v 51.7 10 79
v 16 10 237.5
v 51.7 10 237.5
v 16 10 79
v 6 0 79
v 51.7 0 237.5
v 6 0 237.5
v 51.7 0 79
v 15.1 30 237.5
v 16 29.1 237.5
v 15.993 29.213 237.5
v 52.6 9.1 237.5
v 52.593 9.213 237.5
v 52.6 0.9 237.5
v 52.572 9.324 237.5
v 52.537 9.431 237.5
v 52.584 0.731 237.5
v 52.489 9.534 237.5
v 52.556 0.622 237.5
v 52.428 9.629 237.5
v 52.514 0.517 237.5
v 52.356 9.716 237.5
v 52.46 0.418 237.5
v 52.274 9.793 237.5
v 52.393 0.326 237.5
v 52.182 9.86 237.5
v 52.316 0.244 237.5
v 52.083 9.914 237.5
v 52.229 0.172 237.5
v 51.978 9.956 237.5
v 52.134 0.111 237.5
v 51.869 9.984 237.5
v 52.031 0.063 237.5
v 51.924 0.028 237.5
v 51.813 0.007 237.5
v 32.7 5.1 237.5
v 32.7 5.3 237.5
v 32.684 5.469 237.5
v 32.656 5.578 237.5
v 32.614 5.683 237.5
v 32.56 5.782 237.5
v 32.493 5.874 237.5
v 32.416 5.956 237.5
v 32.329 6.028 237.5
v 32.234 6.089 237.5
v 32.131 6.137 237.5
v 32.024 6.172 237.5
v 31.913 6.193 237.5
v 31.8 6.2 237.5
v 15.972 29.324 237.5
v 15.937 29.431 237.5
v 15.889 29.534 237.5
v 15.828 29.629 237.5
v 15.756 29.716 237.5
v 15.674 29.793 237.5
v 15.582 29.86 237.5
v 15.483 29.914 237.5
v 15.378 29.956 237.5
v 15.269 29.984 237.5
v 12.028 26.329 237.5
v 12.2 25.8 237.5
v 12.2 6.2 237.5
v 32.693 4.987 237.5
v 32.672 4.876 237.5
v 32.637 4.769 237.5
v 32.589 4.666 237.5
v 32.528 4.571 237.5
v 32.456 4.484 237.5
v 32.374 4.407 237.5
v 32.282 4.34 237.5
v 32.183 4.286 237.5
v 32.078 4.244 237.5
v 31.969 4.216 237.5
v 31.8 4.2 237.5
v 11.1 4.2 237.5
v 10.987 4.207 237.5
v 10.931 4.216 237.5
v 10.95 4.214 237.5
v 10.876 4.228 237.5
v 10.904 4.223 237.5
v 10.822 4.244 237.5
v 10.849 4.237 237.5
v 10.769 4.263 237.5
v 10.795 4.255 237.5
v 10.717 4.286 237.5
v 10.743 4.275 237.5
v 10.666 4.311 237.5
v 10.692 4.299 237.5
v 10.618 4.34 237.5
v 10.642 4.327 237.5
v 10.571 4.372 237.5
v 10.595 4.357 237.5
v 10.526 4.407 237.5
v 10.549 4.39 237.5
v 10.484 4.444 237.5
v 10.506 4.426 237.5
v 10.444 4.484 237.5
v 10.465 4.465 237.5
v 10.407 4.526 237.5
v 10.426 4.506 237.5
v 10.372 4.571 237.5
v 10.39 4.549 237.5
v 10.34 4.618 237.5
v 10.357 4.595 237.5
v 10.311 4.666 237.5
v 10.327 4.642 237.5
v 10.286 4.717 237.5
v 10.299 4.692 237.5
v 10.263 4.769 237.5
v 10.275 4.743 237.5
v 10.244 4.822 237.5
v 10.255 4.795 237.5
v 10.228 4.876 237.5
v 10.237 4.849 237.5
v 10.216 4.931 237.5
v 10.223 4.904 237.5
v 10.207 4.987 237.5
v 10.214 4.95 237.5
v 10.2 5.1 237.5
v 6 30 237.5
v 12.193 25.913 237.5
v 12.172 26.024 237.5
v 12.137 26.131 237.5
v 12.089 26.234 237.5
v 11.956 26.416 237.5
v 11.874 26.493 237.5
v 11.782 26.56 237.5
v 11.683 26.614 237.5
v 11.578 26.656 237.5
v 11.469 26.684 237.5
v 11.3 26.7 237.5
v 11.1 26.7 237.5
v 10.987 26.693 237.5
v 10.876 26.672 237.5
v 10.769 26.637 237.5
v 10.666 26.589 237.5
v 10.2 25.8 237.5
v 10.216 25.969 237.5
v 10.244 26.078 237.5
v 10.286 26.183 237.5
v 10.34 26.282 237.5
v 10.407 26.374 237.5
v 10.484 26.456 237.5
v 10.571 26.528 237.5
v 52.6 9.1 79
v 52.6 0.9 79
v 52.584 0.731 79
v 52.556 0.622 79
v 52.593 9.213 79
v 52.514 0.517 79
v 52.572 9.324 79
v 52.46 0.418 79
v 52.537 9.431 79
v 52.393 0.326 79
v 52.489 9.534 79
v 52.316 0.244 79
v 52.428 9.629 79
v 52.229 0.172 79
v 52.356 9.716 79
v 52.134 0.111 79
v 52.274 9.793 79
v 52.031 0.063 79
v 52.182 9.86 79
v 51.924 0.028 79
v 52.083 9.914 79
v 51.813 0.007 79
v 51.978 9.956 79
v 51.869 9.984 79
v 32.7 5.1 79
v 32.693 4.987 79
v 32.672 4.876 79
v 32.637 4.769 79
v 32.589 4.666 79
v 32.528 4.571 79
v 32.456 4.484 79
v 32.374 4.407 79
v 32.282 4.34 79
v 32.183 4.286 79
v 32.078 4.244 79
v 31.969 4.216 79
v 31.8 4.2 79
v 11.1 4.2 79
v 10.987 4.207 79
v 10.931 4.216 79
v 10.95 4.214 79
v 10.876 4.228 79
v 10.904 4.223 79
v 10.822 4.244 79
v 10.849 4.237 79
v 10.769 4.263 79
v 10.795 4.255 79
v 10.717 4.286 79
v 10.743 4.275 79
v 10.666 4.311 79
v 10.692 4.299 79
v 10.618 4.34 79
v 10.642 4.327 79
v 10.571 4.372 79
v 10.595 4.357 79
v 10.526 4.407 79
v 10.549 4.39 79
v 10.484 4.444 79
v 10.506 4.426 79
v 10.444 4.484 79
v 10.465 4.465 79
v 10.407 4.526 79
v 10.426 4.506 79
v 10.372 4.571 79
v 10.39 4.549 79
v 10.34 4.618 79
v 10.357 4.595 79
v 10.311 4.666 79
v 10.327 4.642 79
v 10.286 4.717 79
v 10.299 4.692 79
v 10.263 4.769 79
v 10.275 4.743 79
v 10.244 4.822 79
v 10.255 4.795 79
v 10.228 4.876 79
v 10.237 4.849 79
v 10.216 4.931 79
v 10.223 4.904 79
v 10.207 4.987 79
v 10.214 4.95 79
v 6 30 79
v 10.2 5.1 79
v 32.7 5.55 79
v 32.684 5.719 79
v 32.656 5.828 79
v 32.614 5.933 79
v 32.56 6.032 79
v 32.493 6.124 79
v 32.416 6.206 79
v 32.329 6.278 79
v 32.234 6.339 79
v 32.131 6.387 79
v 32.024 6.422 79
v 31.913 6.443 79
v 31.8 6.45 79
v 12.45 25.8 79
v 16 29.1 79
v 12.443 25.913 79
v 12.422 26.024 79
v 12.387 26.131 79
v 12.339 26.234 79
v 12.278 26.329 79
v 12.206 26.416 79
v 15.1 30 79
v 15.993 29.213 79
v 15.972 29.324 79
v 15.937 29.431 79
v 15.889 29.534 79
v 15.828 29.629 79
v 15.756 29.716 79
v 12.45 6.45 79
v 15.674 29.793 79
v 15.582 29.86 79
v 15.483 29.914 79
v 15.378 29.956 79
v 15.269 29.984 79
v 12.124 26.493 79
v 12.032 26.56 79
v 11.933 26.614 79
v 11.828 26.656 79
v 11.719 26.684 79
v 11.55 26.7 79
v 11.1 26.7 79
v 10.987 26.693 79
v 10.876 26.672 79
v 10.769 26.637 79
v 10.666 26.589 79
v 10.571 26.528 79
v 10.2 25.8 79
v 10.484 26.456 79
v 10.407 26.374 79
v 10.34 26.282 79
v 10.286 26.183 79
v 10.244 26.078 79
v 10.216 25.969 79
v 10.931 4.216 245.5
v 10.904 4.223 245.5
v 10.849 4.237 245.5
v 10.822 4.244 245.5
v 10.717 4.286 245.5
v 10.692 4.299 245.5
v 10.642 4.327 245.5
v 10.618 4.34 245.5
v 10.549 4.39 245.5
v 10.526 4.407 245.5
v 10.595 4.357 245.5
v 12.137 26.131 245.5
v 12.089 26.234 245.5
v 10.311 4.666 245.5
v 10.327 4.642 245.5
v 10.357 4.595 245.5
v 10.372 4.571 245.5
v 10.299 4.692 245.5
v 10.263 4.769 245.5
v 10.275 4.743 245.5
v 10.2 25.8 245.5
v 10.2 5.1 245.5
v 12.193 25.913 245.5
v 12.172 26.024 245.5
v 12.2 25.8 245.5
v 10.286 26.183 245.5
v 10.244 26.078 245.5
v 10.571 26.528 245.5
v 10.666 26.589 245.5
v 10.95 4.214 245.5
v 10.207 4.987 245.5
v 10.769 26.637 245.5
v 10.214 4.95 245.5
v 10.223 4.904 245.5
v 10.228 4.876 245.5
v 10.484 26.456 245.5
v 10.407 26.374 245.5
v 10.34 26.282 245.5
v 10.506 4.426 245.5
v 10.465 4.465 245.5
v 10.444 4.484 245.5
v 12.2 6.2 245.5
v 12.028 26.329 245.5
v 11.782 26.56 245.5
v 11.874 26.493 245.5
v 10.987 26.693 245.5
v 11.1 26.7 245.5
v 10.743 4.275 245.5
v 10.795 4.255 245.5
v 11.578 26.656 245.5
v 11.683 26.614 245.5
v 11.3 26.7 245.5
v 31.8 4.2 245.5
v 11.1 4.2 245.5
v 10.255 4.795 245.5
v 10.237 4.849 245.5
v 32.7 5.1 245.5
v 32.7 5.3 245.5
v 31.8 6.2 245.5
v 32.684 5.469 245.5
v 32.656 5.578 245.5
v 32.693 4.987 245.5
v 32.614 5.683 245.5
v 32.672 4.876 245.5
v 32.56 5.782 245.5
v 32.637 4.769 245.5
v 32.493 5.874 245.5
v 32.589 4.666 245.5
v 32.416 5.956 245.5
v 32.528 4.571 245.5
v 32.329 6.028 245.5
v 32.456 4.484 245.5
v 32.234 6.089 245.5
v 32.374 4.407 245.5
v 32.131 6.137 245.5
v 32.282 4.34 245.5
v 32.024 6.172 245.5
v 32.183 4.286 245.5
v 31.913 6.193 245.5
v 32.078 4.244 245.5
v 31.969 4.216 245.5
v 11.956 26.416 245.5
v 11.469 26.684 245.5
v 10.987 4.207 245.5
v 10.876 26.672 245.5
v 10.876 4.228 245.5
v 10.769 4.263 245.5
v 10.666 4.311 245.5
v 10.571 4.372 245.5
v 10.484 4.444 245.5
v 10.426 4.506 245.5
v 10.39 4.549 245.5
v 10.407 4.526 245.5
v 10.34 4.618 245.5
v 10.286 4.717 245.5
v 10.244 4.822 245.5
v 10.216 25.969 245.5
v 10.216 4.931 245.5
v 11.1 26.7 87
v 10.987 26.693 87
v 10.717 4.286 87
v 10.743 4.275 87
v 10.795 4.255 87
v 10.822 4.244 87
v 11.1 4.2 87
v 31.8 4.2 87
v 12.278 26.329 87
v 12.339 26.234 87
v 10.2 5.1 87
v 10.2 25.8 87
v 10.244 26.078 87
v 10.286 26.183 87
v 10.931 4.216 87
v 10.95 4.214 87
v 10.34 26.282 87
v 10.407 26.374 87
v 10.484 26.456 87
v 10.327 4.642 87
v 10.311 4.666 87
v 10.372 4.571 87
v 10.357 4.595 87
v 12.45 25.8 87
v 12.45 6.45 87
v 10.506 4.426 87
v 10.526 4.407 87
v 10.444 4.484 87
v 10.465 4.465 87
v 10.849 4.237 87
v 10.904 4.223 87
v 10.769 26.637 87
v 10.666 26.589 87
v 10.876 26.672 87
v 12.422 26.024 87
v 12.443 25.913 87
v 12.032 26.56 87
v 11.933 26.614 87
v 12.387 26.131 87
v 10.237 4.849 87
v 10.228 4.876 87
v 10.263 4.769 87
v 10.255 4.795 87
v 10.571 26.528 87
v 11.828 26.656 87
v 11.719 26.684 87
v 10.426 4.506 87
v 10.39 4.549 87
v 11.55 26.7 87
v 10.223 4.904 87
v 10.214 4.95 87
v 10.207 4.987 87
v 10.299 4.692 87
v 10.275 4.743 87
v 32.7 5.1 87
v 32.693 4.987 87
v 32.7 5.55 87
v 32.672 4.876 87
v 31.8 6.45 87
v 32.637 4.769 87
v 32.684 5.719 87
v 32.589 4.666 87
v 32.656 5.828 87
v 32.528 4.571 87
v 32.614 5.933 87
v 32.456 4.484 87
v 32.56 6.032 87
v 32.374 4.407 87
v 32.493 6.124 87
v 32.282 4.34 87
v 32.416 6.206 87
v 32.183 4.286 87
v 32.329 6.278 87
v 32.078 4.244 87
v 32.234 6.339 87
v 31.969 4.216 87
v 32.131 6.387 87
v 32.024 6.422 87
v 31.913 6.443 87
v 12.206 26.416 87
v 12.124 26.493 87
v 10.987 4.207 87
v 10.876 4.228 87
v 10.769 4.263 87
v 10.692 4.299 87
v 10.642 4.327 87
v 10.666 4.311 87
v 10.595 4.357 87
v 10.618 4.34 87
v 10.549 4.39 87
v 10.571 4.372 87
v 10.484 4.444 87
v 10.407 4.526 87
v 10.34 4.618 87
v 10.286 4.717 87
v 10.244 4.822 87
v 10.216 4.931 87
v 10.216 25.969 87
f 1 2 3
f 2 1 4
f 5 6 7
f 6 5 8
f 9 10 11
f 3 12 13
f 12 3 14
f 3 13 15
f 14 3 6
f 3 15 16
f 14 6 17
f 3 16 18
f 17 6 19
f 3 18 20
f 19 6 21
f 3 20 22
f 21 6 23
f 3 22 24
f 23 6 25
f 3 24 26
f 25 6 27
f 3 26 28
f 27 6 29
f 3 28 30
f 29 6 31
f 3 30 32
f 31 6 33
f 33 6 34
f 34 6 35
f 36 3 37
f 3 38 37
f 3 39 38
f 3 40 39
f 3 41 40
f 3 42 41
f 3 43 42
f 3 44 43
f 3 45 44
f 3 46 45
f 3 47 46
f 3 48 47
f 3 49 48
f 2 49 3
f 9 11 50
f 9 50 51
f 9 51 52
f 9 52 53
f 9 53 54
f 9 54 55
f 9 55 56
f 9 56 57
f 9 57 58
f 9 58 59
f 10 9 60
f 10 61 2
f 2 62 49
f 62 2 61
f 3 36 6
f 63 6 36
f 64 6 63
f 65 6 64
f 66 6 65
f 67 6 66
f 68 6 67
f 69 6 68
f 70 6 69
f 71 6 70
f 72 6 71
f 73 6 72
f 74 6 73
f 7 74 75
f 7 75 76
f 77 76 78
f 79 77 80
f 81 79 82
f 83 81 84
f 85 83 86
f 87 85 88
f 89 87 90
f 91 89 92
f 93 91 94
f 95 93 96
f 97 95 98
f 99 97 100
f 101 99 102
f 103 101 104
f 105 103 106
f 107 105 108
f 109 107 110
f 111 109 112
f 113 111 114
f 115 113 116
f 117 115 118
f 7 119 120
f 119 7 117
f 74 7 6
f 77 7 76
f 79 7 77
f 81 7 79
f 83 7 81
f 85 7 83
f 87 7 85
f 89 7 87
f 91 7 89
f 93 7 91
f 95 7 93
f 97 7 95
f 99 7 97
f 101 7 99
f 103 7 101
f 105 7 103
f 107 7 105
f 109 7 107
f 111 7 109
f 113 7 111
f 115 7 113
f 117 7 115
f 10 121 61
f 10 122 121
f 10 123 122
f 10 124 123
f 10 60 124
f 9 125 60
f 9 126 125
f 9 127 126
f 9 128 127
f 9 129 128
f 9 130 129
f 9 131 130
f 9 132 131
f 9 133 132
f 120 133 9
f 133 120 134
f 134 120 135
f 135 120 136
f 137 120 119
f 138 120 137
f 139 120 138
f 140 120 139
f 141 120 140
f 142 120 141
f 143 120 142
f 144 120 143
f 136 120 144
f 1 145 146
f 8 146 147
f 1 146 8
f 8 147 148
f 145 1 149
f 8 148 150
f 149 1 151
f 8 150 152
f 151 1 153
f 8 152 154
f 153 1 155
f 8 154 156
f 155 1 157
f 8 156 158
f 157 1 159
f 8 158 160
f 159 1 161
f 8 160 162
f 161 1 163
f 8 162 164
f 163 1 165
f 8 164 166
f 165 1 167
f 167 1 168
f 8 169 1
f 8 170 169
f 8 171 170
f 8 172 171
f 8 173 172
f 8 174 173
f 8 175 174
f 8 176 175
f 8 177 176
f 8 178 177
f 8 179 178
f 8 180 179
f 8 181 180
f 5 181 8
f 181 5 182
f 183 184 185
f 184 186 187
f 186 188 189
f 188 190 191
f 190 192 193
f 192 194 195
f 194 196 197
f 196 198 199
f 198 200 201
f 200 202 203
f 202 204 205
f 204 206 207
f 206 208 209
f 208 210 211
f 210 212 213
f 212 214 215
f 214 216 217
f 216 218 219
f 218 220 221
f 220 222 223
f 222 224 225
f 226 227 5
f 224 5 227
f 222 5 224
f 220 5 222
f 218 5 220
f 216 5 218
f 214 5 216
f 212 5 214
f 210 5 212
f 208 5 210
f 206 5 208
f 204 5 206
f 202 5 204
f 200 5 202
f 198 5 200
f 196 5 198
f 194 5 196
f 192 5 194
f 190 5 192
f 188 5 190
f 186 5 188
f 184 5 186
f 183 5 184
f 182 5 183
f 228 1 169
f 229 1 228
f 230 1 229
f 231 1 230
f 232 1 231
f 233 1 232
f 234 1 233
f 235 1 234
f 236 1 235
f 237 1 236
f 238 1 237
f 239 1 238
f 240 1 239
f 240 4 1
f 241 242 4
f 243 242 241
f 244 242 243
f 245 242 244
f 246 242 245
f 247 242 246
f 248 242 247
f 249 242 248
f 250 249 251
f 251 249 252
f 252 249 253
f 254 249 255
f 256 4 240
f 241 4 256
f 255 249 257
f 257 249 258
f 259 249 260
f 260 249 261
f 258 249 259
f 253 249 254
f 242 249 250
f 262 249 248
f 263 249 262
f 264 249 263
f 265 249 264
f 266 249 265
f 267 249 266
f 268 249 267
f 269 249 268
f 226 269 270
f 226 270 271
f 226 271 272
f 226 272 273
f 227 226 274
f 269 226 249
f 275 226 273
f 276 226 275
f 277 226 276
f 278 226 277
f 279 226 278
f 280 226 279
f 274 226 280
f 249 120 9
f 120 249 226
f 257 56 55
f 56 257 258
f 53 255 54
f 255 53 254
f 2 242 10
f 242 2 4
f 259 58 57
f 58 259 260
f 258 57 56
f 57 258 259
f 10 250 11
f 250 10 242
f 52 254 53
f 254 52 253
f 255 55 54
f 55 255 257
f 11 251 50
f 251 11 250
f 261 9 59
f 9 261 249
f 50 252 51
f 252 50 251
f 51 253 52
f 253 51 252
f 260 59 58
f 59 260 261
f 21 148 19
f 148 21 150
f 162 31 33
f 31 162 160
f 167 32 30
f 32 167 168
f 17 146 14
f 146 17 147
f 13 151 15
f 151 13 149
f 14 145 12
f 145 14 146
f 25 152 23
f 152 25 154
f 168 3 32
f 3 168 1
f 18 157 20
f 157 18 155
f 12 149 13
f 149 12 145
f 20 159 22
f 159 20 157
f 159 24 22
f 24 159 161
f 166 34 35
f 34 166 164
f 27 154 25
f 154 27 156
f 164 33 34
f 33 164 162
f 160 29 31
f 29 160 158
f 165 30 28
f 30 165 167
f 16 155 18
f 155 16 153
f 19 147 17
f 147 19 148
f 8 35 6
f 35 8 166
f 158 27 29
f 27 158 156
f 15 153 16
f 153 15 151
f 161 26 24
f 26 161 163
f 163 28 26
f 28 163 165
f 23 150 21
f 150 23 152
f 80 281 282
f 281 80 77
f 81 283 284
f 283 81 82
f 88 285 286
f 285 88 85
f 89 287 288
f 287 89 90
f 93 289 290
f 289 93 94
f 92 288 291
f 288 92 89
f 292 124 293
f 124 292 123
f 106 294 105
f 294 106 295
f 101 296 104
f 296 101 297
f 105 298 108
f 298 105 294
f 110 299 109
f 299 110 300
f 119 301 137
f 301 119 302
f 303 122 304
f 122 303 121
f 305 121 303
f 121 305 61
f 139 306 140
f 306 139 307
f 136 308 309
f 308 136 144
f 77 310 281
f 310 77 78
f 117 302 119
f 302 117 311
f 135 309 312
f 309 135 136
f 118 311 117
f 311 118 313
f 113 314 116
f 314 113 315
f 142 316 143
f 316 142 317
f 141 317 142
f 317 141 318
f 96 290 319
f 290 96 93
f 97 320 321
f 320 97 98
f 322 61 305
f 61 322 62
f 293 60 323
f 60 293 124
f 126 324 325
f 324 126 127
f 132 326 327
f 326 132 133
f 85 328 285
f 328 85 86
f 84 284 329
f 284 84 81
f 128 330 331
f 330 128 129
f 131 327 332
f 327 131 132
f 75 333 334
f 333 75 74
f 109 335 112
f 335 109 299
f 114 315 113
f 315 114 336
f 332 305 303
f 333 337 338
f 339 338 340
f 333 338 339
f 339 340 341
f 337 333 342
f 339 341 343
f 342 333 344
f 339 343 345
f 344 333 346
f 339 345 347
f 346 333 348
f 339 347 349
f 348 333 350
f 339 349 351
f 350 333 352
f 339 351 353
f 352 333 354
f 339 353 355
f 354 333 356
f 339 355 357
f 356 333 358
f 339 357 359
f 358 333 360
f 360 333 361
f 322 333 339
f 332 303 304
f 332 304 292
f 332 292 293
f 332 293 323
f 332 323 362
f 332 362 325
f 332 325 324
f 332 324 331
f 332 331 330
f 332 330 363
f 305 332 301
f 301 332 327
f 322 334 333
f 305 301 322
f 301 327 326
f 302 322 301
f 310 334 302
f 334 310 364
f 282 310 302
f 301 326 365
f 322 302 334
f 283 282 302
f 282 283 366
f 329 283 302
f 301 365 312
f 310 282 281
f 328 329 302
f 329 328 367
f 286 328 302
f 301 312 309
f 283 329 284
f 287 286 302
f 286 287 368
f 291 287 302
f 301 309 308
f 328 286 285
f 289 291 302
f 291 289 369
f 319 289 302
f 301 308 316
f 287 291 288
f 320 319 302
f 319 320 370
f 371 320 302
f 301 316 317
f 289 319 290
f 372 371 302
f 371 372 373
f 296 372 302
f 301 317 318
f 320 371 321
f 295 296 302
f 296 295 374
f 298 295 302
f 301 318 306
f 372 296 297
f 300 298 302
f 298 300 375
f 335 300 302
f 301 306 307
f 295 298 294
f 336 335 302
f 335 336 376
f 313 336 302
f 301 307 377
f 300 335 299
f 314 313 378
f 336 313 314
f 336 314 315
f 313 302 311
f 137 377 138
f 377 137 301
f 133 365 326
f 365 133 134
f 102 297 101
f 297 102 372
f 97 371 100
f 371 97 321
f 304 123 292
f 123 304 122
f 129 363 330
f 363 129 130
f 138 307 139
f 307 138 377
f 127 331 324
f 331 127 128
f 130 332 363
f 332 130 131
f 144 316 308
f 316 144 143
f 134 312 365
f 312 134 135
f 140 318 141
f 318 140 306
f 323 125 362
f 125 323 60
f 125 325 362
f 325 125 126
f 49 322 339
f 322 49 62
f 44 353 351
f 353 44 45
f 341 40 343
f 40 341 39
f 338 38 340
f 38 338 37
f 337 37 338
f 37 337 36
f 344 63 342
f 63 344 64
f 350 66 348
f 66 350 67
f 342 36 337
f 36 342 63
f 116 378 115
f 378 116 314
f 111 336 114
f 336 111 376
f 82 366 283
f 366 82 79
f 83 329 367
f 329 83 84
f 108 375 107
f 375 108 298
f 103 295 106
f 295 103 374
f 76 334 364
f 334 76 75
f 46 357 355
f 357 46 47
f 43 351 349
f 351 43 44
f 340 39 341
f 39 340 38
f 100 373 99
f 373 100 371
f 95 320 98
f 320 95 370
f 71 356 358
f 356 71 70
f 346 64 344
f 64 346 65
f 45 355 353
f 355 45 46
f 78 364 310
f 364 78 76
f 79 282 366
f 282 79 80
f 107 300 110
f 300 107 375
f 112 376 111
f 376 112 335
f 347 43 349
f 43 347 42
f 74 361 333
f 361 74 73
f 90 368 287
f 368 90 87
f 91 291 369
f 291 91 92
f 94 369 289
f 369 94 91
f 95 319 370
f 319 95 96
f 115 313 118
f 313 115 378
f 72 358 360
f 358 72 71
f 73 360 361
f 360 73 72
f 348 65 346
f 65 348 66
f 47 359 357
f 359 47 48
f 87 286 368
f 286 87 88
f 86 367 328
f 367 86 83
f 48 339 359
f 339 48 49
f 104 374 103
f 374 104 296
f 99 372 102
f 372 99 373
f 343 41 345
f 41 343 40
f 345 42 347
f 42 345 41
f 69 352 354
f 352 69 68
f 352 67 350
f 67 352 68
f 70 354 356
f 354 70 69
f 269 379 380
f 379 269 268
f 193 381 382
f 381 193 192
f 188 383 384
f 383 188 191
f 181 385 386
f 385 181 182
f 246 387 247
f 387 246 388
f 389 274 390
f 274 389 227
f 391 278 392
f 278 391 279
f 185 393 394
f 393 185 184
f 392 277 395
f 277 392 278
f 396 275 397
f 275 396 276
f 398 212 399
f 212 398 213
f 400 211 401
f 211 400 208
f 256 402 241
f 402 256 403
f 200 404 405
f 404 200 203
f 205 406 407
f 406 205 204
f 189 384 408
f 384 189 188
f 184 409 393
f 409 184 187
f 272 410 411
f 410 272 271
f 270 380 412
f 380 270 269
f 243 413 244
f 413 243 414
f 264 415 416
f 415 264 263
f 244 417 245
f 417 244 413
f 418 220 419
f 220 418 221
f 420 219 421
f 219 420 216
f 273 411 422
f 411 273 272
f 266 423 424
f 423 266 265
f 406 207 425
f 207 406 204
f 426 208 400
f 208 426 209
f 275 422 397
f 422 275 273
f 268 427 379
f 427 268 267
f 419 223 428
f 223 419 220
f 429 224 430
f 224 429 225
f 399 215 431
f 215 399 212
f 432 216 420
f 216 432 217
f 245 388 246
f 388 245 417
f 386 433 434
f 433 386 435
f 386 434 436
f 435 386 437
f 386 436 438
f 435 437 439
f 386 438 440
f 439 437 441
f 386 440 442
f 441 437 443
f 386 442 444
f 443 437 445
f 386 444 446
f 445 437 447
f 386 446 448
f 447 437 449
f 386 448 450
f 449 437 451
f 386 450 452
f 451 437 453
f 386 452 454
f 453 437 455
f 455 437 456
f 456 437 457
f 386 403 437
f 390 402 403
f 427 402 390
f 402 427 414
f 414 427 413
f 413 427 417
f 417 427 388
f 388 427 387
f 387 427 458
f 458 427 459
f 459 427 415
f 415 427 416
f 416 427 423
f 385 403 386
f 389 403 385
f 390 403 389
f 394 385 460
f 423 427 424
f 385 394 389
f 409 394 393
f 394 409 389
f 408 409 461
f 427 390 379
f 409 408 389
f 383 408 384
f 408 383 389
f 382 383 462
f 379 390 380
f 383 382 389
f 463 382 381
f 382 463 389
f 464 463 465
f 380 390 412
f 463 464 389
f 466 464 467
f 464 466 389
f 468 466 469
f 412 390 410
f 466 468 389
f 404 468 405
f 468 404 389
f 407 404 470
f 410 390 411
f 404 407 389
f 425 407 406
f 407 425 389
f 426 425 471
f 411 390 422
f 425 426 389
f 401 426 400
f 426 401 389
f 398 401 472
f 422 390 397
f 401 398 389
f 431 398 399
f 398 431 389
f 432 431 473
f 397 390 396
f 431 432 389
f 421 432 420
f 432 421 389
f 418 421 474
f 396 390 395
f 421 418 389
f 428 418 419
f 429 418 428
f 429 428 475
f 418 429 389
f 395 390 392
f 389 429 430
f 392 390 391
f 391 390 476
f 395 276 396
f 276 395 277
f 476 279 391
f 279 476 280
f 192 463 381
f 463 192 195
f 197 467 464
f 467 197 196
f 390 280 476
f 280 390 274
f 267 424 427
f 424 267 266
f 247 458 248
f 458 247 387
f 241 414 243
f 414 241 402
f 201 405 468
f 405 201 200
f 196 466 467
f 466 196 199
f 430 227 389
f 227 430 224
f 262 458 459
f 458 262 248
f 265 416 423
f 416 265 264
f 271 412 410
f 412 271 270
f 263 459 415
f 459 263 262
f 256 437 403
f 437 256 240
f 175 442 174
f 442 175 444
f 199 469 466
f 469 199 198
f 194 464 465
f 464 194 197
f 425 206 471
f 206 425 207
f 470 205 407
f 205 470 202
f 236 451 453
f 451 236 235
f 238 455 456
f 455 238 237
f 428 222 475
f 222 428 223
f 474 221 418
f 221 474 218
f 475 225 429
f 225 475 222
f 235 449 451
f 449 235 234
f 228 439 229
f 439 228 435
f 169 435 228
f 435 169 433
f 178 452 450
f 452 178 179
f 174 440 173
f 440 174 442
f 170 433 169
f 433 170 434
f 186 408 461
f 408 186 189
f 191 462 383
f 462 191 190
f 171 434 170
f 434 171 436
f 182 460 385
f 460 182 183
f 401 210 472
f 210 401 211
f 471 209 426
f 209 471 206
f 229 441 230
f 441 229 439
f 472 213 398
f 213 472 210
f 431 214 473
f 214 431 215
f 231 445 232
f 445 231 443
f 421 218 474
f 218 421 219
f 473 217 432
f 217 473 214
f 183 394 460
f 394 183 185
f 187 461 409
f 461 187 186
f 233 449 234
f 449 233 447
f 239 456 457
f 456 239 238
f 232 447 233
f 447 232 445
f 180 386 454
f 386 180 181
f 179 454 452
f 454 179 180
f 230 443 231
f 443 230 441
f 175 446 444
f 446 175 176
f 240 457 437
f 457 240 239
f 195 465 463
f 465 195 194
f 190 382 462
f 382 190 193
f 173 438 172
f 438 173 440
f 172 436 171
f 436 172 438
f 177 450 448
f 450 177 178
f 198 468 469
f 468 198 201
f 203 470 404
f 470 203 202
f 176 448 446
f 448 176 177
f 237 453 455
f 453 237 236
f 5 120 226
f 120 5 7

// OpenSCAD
// file: construction.scad
/*
Specialized construction functions specifically for the enclosure.
By combining these operators the various instances of enclosur pieces 
can be constructed.
*/
include <parameters.scad>;
use <utility.scad>;

module interlock() {
    ra = knob_diameter/2;
    rb = lug_diameter/2;
    
    color("DarkSeaGreen")
        rotate([0,90,90]) 
            rotate_extrude()
                polygon([[0,0],[0,lug_height],[rb,lug_height],
                    [rb,2.5],[ra,1],[ra,0]]);
}

module frame( width, height, thickness, roundness ) {
    color("SteelBlue") 
        linear_extrude(height=height)
            apply_roundness(roundness, $fs =0.01) 
                    square( [thickness, width] );
}

module frame_corner( width, height, thickness, roundness ) {    
    union() {
        mirror([0,1,0]) 
            rotate([0,0,-90])
                frame( width, height, thickness, roundness );
        frame( width, height, thickness + panel_thickness, roundness );
    }   
}

module frame_connector_corner(clearance=0) {
    translate([panel_thickness*1.7,panel_thickness*0.70, 0]) 
        color("SteelBlue") cornerize()
            frame( frame_corner_width*0.75, frame_connector_depth, 
                frame_thickness*.20+clearance, corner_roundness );
        
}

module add_lugs() {   
    union() {
        children(0);

        translate([interlock_offset_x,-lug_height,interlock_offset_z]) 
            interlock();

        translate([interlock_offset_x,-lug_height,
                interlock_offset_z+interlock_gap])
            interlock(); 
    } 
}

module add_connector(height=frame_corner_height) {
    union() {
        children(0);
        translate([0,0,height])
            frame_connector_corner();
    }
}

module add_hinge_post( top=false ) {
    hinge_position=[frame_corner_width+plastic_thickness+hinge_gap,
          hinge_inner_diameter/2, (top?frame_corner_height:0)];
    union() {
        children(0);
        fix_preview() translate(hinge_position) 
            mirror(top?[0,0,1]:[0,0,0])
                hinge_post();
    }
}

module add_outside_frame( height ) {
    color("SteelBlue")
    union() {
        children(0);
        translate([-plastic_thickness,-plastic_thickness,0])
            frame( frame_corner_width+plastic_thickness, height, frame_thickness,
                corner_roundness);
        translate([14.5,0.05,height/2])
            rotate([0,0,8])
            cube([frame_corner_width/2,plastic_thickness,height],true);
    }
}

module hinge_post() {
     union() {
        difference() {
            
            // add material to support the hinge and fill 
            // the gap betwen the perspex doors and the plastic frame
            translate([-hinge_inner_diameter*2, 
                    hinge_inner_diameter/2,0]) 
                rotate([0,0,-90])
                    frame( hinge_inner_diameter*3+1, 
                        frame_corner_height, hinge_inner_diameter, 
                        corner_roundness );
            
            // create a negative space that snuggly fits the hinge
            union() {
                height = hinge_height-hinge_inner_diameter;
                translate([0,0,height/2]) 
                    cube([hinge_inner_diameter+2,
                        hinge_inner_diameter+2,height+0.2],true);
                
                rotate([0,0,-90]) 
                    translate([0,0,-1.4]) 
                        scale([1.1,1.1,1.1]) hinge();
            }
        }
        color("SteelBlue")
        cylinder(d=hinge_inner_diameter, frame_corner_height);
    }
}

module hinge() {
    height = hinge_height-hinge_inner_diameter;
    width = hinge_inner_diameter+hinge_ring_thickness;
    difference() {
        
        // create the base shape for the hinge
        color("Salmon") union() {
            
            cylinder(d=width, height);
            
            translate([hinge_inner_diameter*3+hinge_clearance,
                -hinge_offset,height/2-plastic_thickness/2]) 
                cube([hinge_length,hinge_thickness,
                    height+plastic_thickness],true);
           
            translate([2.52,-5.2,height/2]) 
                rotate([0,0,40]) 
                    cube([hinge_inner_diameter,
                        width+1,height],true);
        }
        
        // remove a hole for the hinge post to slide into
        cylinder(d=hinge_inner_diameter+tolerance_smooth, height+1);
        
        // trim the left corner
        translate([4,-17.5,height/2-1]) 
            rotate([0,0,145]) 
                cube([50,width-2,height+3],true);
        
        // smooth the tranistion to the bottom edge
        translate([19,-10,height/2-17.85]) 
            rotate([-88.5,0.1,96]) 
                cube([40,20,100],true);
        
        // add a chamfer to right corner
        translate([hinge_length+8,0,height+25]) 
            rotate([0,45,0]) 
            cube(50,true);
    }   
}

module add_connector_slot() {
    difference() {
        children(0);
        frame_connector_corner(tolerance_tight);
    }
}

module frame_vertical() {
    add_connector_slot()
        add_connector(frame_vertical_height)
            union() {   
                frame_corner( frame_corner_width, 
                    frame_vertical_height, frame_thickness, 
                    corner_roundness );
                
                translate([hinge_inner_diameter*2, 
                        hinge_inner_diameter,0]) 
                    rotate([0,0,-90])
                        frame( hinge_inner_diameter*3+2.6, 
                            frame_vertical_height, 
                            hinge_inner_diameter, 
                            corner_roundness );
            }     
}
// file: support.scad
/*
Provides support objects that are used to model the environment of the enclosure
to ensure the pieces slot together and fit properly.
*/
include <parameters.scad>;
use <utility.scad>;

module wall_panel() {
    cube([panel_height,panel_width,panel_thickness]);
}

module door_panel() {
     cube([door_panel_width,door_panel_height,door_panel_thickness]);
}

module left_wall_panel() {
    translate([panel_thickness,0,panel_offset_z]) 
        rotate([0,-90,0]) 
            wall_panel();
}

module back_wall_panel() {
    translate([(enclosure_width-panel_width)/2,
            enclosure_depth-panel_thickness-plastic_thickness,
            panel_offset_z]) 
        rotate([-90,-90,0]) 
            wall_panel();
}

module right_wall_panel() {
    translate([enclosure_width,0,panel_offset_z]) 
        rotate([0,-90,0]) 
            wall_panel();
}

module left_door(open=false) {
    translate([frame_corner_width+plastic_thickness+hinge_gap,
            hinge_inner_diameter/2,0]) 
        rotate([90,0,open?-90:0]) 
            translate([door_hinge_offset,0,hinge_offset-
                    door_panel_thickness/2])
                door_panel();
}

module right_door(open=false) {
    translate([enclosure_width,0,0])  
        mirror([1,0,0]) left_door(open);
}
// file: utility.scad
/*
Generically useful utility functions.
*/

// applies roundness without altering dimensions of object
module apply_roundness(r)
    offset(r) offset(delta=-r) children(0);

// makes a corner piece by mirroring and rotating one side
module cornerize() {
    union() {
        children(0);
        mirror([0,1,0]) 
            rotate([0,0,-90])
                children(0);
    }
} 

/*
 The fix_preview series of functions are used to make small
 translations in order to reduce conincident plane artifacts
 from the preview mode. 

 It would be nice to have just one module for this but I haven't
 figured out a way of doing this generically - so the following
 uses a small translation in different directions depending on
 the use case needed.
*/
module fix_preview() {
    translate($preview?[-0.001,-0.001,-0.001]:[0,0,0])
        children(0);
}

module fix_preview2() {
    translate($preview?[-0.001,0.001,-0.001]:[0,0,0])
        children(0);
}

module fix_preview3() {
    translate($preview?[-0.001,0.001,0.001]:[0,0,0])
        children(0);
}
// file: parameters.scad
$fn=50;

// Wall thickness and tolerance
plastic_thickness=2.0;
tolerance_smooth=0.30;
tolerance_tight=0.25;

// Specify enclosure dimensions
enclosure_height=475.0;
enclosure_depth=535.0;

// Wall panel dimensions
panel_thickness=6.0;
panel_height=450.0;
panel_width=535.0;
panel_offset_z = enclosure_height - panel_height;

// Door panel dimensions
door_panel_thickness=3.0;
door_panel_width=250.0;
door_panel_height=475.0;
door_hinge_offset=6.5;

// Frame
frame_corner_width=30.0;
frame_corner_height=79.0;
frame_thickness = plastic_thickness*2 + panel_thickness;
frame_side = (enclosure_height - frame_corner_height*2)/2;
frame_clip_height=50.5;
corner_roundness=0.9;
frame_vertical_height = (enclosure_height-frame_corner_height*2)/2;
frame_connector_depth = 8.0;

// Interlock
knob_diameter=9.8;
lug_diameter=6.2;
lug_gap=1.4;
lug_height = lug_gap+2.15;
interlock_offset_x=15.0;
interlock_offset_z=27.0;
interlock_gap=32;

// Door hinge
hinge_inner_diameter=10;
hinge_height=25;
hinge_length=53;
hinge_gap = 9.6;
hinge_clearance = 1.5;
hinge_ring_thickness=3.0;
hinge_thickness=plastic_thickness*2 + door_panel_thickness;
hinge_offset=6.5+plastic_thickness;

enclosure_width=2*(frame_corner_width+plastic_thickness+hinge_gap
    +door_hinge_offset) + door_panel_width*2 +tolerance_smooth;
// main file
include <parameters.scad>
use <utility.scad>
use <support.scad>
use <construction.scad>

module front_left_vertical_a() {
    difference() {
        translate([0,0,frame_corner_height])
            frame_vertical();
        fix_preview() left_wall_panel();
    }
}

front_left_vertical_a();
